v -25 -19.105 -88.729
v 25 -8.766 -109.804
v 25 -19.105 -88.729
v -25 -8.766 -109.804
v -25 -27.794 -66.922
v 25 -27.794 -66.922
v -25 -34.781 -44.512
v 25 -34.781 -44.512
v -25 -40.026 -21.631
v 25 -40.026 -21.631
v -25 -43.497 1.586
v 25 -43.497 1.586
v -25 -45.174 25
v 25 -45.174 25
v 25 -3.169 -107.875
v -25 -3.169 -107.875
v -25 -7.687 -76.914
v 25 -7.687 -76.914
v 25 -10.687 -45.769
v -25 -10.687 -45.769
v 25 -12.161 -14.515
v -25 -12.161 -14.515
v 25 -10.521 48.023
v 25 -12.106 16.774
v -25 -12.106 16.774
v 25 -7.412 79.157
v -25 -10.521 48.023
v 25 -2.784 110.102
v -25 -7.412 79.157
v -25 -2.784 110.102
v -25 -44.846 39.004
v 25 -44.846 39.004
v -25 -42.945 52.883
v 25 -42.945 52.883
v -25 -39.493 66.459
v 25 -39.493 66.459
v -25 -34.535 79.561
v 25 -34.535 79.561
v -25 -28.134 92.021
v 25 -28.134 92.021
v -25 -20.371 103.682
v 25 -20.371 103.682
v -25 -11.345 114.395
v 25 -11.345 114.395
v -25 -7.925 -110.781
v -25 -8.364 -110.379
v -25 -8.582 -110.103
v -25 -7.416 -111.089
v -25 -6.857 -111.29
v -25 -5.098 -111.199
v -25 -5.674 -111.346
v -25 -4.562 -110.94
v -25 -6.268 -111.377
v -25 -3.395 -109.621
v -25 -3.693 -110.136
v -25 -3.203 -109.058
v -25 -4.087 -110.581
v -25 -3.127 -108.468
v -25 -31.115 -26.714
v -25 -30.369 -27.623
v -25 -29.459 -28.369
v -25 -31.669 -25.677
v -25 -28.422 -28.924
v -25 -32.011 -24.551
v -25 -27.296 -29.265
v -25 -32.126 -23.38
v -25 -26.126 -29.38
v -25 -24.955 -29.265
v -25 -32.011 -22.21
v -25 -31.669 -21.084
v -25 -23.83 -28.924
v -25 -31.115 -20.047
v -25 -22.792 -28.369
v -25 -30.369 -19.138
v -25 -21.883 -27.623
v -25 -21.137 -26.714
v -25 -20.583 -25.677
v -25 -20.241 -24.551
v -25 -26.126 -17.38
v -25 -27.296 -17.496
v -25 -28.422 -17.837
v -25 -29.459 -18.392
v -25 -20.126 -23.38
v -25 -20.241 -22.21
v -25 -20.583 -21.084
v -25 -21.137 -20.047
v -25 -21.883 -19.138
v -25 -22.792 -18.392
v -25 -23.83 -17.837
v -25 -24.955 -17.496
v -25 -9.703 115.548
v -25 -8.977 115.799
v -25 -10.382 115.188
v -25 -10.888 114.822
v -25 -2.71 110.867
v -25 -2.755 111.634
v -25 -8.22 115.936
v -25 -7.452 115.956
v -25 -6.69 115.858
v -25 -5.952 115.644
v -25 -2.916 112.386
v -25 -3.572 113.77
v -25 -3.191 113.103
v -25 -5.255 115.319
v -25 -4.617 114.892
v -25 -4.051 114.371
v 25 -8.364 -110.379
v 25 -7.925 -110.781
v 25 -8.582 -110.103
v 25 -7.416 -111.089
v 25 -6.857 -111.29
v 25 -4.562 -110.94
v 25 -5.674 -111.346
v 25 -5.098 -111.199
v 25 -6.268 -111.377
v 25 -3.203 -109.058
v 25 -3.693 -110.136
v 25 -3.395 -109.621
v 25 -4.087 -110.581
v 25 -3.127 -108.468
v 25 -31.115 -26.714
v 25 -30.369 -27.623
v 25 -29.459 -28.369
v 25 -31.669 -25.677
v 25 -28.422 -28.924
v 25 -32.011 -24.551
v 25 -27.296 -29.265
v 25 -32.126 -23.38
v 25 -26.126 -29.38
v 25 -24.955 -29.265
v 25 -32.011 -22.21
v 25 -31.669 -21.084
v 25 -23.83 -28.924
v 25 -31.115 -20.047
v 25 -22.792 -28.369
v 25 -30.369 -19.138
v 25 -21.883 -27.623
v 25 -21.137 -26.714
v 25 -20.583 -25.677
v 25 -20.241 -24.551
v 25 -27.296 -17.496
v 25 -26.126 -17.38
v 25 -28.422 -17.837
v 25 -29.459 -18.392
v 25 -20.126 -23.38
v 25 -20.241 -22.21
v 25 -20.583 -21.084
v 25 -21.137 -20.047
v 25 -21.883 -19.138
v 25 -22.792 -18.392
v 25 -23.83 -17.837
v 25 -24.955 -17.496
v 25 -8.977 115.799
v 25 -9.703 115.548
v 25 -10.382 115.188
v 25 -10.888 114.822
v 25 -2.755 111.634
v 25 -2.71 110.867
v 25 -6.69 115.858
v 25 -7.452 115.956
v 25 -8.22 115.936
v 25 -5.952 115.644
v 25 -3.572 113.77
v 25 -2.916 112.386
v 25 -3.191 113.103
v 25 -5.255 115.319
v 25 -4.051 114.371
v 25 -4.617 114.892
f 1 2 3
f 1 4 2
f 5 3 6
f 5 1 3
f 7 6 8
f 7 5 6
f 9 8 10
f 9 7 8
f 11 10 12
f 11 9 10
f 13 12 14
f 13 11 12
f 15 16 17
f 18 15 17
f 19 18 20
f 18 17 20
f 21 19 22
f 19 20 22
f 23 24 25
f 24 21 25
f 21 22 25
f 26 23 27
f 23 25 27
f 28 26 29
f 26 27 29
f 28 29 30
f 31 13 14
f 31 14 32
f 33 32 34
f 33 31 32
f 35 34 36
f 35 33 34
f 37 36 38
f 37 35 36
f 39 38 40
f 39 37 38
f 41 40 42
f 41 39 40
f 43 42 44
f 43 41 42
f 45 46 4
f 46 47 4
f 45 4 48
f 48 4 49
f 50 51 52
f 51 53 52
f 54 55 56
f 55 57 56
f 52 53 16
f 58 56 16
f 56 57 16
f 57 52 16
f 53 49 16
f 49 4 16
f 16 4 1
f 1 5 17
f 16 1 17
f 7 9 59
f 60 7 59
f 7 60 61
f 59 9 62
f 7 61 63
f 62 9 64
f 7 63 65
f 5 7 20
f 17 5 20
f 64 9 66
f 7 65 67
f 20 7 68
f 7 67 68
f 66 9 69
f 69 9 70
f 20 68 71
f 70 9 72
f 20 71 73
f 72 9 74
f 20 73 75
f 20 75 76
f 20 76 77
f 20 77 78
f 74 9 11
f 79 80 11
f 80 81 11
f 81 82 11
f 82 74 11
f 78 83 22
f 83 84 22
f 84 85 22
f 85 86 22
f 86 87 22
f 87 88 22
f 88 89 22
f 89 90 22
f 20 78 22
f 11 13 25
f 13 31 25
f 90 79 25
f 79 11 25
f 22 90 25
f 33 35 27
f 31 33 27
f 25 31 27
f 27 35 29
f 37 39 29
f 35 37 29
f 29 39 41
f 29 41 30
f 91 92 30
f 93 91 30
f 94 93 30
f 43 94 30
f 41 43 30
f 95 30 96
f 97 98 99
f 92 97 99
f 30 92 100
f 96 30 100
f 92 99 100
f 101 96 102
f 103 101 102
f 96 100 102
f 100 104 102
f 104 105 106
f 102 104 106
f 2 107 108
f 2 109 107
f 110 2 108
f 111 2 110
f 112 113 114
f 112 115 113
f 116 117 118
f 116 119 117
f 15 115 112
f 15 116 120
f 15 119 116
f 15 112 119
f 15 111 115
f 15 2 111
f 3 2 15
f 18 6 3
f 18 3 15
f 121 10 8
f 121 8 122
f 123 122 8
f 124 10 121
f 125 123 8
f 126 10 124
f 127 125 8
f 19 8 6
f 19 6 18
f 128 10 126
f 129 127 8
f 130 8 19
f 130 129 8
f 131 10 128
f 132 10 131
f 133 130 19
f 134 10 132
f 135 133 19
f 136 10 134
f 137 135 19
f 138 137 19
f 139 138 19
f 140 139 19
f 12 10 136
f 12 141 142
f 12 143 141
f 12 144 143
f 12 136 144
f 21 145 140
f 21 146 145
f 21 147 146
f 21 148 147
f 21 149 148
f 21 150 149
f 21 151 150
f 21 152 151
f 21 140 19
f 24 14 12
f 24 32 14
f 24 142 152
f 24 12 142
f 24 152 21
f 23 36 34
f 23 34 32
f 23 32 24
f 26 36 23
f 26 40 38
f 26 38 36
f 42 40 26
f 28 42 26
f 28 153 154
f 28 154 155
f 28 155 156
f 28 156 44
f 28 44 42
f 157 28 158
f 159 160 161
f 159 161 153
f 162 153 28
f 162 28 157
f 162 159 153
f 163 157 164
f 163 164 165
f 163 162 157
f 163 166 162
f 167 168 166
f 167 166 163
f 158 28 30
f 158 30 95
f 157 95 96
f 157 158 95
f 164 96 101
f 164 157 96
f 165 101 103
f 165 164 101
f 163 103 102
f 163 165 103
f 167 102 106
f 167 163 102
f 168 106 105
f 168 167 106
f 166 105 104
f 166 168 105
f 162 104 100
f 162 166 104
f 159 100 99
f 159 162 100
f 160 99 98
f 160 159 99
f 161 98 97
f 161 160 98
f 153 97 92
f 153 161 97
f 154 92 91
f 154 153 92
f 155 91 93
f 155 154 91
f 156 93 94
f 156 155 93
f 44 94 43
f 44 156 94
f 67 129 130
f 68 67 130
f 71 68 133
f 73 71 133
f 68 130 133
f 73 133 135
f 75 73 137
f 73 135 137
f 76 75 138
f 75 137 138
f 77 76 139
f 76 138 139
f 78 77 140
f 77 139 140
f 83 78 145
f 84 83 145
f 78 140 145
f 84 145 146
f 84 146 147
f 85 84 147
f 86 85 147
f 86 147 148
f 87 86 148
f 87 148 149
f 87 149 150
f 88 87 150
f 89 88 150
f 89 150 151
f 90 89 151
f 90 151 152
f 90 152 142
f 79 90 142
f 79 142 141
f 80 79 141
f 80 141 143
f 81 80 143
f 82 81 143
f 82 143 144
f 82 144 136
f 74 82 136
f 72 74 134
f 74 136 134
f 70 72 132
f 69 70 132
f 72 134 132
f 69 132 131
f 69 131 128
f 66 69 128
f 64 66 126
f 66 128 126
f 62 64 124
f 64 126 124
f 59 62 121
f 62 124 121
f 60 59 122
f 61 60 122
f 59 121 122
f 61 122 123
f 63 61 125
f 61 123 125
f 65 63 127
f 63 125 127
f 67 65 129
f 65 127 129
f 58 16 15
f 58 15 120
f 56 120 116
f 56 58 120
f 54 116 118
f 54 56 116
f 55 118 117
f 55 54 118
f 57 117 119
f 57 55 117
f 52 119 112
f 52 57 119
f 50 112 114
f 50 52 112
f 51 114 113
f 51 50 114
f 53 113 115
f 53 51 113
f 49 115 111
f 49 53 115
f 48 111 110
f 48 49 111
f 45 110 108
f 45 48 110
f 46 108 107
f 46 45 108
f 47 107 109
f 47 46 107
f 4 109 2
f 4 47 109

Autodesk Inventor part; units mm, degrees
ref_plane "YZ Plane" through (0, 0, 0) normal (1, 0, 0) x (0, 1, 0)
ref_plane "XZ Plane" through (0, 0, 0) normal (0, 1, 0) x (-1, 0, 0)
ref_plane "XY Plane" through (0, 0, 0) normal (0, 0, 1) x (1, 0, 0)
sketch "スケッチ1" plane through (0, 0, 0) normal (1, 0, 0) x (0, 1, 0)
  line L0 (0, 125) -> (0, -125)
  line L1 (-193.7075, 0) -> (764.5712, 0) projected
  arc A0 (0, 125) -> (0, -125) centre (627.6743, 0) ccw
  arc A1 (0, 125) -> (-45.1737, 25) centre (79.0119, 29.1041) ccw
  arc A2 (-45.1737, 25) -> (0, -125) centre (259.9333, 35.0832) ccw
  point P0 (0, 0)
  point P1 (0, 0)
  dimension "d0" = 250
  dimension "d1" = 640
  dimension "d16" = 100
extrude "押し出し4" add sketch "スケッチ1" along normal mid plane 50 contours A0 L1 A2 A1 | A0 A2 L1
fillet "フィレット3" radius 5 1 edges at (0, 0, 125)
fillet "フィレット3" radius 3 1 edges at (0, 0, -125)
sketch "スケッチ4" plane through (25, 0, 0) normal (1, 0, 0) x (0, 0, -1)
  circle A0 centre (23.3804, -26.1259) radius 6
  arc A1 (109.8042, -8.7665) -> (107.8747, -3.1688) centre (108.3804, -6.1259) ccw projected
  point P0 (0, 0)
  dimension "d21" = 12
  dimension "d22" = 85
  dimension "d23" = 20
extrude "押し出し5" cut sketch "スケッチ4" against normal through all
properties part number "styro_50_sub" material "ポリスチレン"
